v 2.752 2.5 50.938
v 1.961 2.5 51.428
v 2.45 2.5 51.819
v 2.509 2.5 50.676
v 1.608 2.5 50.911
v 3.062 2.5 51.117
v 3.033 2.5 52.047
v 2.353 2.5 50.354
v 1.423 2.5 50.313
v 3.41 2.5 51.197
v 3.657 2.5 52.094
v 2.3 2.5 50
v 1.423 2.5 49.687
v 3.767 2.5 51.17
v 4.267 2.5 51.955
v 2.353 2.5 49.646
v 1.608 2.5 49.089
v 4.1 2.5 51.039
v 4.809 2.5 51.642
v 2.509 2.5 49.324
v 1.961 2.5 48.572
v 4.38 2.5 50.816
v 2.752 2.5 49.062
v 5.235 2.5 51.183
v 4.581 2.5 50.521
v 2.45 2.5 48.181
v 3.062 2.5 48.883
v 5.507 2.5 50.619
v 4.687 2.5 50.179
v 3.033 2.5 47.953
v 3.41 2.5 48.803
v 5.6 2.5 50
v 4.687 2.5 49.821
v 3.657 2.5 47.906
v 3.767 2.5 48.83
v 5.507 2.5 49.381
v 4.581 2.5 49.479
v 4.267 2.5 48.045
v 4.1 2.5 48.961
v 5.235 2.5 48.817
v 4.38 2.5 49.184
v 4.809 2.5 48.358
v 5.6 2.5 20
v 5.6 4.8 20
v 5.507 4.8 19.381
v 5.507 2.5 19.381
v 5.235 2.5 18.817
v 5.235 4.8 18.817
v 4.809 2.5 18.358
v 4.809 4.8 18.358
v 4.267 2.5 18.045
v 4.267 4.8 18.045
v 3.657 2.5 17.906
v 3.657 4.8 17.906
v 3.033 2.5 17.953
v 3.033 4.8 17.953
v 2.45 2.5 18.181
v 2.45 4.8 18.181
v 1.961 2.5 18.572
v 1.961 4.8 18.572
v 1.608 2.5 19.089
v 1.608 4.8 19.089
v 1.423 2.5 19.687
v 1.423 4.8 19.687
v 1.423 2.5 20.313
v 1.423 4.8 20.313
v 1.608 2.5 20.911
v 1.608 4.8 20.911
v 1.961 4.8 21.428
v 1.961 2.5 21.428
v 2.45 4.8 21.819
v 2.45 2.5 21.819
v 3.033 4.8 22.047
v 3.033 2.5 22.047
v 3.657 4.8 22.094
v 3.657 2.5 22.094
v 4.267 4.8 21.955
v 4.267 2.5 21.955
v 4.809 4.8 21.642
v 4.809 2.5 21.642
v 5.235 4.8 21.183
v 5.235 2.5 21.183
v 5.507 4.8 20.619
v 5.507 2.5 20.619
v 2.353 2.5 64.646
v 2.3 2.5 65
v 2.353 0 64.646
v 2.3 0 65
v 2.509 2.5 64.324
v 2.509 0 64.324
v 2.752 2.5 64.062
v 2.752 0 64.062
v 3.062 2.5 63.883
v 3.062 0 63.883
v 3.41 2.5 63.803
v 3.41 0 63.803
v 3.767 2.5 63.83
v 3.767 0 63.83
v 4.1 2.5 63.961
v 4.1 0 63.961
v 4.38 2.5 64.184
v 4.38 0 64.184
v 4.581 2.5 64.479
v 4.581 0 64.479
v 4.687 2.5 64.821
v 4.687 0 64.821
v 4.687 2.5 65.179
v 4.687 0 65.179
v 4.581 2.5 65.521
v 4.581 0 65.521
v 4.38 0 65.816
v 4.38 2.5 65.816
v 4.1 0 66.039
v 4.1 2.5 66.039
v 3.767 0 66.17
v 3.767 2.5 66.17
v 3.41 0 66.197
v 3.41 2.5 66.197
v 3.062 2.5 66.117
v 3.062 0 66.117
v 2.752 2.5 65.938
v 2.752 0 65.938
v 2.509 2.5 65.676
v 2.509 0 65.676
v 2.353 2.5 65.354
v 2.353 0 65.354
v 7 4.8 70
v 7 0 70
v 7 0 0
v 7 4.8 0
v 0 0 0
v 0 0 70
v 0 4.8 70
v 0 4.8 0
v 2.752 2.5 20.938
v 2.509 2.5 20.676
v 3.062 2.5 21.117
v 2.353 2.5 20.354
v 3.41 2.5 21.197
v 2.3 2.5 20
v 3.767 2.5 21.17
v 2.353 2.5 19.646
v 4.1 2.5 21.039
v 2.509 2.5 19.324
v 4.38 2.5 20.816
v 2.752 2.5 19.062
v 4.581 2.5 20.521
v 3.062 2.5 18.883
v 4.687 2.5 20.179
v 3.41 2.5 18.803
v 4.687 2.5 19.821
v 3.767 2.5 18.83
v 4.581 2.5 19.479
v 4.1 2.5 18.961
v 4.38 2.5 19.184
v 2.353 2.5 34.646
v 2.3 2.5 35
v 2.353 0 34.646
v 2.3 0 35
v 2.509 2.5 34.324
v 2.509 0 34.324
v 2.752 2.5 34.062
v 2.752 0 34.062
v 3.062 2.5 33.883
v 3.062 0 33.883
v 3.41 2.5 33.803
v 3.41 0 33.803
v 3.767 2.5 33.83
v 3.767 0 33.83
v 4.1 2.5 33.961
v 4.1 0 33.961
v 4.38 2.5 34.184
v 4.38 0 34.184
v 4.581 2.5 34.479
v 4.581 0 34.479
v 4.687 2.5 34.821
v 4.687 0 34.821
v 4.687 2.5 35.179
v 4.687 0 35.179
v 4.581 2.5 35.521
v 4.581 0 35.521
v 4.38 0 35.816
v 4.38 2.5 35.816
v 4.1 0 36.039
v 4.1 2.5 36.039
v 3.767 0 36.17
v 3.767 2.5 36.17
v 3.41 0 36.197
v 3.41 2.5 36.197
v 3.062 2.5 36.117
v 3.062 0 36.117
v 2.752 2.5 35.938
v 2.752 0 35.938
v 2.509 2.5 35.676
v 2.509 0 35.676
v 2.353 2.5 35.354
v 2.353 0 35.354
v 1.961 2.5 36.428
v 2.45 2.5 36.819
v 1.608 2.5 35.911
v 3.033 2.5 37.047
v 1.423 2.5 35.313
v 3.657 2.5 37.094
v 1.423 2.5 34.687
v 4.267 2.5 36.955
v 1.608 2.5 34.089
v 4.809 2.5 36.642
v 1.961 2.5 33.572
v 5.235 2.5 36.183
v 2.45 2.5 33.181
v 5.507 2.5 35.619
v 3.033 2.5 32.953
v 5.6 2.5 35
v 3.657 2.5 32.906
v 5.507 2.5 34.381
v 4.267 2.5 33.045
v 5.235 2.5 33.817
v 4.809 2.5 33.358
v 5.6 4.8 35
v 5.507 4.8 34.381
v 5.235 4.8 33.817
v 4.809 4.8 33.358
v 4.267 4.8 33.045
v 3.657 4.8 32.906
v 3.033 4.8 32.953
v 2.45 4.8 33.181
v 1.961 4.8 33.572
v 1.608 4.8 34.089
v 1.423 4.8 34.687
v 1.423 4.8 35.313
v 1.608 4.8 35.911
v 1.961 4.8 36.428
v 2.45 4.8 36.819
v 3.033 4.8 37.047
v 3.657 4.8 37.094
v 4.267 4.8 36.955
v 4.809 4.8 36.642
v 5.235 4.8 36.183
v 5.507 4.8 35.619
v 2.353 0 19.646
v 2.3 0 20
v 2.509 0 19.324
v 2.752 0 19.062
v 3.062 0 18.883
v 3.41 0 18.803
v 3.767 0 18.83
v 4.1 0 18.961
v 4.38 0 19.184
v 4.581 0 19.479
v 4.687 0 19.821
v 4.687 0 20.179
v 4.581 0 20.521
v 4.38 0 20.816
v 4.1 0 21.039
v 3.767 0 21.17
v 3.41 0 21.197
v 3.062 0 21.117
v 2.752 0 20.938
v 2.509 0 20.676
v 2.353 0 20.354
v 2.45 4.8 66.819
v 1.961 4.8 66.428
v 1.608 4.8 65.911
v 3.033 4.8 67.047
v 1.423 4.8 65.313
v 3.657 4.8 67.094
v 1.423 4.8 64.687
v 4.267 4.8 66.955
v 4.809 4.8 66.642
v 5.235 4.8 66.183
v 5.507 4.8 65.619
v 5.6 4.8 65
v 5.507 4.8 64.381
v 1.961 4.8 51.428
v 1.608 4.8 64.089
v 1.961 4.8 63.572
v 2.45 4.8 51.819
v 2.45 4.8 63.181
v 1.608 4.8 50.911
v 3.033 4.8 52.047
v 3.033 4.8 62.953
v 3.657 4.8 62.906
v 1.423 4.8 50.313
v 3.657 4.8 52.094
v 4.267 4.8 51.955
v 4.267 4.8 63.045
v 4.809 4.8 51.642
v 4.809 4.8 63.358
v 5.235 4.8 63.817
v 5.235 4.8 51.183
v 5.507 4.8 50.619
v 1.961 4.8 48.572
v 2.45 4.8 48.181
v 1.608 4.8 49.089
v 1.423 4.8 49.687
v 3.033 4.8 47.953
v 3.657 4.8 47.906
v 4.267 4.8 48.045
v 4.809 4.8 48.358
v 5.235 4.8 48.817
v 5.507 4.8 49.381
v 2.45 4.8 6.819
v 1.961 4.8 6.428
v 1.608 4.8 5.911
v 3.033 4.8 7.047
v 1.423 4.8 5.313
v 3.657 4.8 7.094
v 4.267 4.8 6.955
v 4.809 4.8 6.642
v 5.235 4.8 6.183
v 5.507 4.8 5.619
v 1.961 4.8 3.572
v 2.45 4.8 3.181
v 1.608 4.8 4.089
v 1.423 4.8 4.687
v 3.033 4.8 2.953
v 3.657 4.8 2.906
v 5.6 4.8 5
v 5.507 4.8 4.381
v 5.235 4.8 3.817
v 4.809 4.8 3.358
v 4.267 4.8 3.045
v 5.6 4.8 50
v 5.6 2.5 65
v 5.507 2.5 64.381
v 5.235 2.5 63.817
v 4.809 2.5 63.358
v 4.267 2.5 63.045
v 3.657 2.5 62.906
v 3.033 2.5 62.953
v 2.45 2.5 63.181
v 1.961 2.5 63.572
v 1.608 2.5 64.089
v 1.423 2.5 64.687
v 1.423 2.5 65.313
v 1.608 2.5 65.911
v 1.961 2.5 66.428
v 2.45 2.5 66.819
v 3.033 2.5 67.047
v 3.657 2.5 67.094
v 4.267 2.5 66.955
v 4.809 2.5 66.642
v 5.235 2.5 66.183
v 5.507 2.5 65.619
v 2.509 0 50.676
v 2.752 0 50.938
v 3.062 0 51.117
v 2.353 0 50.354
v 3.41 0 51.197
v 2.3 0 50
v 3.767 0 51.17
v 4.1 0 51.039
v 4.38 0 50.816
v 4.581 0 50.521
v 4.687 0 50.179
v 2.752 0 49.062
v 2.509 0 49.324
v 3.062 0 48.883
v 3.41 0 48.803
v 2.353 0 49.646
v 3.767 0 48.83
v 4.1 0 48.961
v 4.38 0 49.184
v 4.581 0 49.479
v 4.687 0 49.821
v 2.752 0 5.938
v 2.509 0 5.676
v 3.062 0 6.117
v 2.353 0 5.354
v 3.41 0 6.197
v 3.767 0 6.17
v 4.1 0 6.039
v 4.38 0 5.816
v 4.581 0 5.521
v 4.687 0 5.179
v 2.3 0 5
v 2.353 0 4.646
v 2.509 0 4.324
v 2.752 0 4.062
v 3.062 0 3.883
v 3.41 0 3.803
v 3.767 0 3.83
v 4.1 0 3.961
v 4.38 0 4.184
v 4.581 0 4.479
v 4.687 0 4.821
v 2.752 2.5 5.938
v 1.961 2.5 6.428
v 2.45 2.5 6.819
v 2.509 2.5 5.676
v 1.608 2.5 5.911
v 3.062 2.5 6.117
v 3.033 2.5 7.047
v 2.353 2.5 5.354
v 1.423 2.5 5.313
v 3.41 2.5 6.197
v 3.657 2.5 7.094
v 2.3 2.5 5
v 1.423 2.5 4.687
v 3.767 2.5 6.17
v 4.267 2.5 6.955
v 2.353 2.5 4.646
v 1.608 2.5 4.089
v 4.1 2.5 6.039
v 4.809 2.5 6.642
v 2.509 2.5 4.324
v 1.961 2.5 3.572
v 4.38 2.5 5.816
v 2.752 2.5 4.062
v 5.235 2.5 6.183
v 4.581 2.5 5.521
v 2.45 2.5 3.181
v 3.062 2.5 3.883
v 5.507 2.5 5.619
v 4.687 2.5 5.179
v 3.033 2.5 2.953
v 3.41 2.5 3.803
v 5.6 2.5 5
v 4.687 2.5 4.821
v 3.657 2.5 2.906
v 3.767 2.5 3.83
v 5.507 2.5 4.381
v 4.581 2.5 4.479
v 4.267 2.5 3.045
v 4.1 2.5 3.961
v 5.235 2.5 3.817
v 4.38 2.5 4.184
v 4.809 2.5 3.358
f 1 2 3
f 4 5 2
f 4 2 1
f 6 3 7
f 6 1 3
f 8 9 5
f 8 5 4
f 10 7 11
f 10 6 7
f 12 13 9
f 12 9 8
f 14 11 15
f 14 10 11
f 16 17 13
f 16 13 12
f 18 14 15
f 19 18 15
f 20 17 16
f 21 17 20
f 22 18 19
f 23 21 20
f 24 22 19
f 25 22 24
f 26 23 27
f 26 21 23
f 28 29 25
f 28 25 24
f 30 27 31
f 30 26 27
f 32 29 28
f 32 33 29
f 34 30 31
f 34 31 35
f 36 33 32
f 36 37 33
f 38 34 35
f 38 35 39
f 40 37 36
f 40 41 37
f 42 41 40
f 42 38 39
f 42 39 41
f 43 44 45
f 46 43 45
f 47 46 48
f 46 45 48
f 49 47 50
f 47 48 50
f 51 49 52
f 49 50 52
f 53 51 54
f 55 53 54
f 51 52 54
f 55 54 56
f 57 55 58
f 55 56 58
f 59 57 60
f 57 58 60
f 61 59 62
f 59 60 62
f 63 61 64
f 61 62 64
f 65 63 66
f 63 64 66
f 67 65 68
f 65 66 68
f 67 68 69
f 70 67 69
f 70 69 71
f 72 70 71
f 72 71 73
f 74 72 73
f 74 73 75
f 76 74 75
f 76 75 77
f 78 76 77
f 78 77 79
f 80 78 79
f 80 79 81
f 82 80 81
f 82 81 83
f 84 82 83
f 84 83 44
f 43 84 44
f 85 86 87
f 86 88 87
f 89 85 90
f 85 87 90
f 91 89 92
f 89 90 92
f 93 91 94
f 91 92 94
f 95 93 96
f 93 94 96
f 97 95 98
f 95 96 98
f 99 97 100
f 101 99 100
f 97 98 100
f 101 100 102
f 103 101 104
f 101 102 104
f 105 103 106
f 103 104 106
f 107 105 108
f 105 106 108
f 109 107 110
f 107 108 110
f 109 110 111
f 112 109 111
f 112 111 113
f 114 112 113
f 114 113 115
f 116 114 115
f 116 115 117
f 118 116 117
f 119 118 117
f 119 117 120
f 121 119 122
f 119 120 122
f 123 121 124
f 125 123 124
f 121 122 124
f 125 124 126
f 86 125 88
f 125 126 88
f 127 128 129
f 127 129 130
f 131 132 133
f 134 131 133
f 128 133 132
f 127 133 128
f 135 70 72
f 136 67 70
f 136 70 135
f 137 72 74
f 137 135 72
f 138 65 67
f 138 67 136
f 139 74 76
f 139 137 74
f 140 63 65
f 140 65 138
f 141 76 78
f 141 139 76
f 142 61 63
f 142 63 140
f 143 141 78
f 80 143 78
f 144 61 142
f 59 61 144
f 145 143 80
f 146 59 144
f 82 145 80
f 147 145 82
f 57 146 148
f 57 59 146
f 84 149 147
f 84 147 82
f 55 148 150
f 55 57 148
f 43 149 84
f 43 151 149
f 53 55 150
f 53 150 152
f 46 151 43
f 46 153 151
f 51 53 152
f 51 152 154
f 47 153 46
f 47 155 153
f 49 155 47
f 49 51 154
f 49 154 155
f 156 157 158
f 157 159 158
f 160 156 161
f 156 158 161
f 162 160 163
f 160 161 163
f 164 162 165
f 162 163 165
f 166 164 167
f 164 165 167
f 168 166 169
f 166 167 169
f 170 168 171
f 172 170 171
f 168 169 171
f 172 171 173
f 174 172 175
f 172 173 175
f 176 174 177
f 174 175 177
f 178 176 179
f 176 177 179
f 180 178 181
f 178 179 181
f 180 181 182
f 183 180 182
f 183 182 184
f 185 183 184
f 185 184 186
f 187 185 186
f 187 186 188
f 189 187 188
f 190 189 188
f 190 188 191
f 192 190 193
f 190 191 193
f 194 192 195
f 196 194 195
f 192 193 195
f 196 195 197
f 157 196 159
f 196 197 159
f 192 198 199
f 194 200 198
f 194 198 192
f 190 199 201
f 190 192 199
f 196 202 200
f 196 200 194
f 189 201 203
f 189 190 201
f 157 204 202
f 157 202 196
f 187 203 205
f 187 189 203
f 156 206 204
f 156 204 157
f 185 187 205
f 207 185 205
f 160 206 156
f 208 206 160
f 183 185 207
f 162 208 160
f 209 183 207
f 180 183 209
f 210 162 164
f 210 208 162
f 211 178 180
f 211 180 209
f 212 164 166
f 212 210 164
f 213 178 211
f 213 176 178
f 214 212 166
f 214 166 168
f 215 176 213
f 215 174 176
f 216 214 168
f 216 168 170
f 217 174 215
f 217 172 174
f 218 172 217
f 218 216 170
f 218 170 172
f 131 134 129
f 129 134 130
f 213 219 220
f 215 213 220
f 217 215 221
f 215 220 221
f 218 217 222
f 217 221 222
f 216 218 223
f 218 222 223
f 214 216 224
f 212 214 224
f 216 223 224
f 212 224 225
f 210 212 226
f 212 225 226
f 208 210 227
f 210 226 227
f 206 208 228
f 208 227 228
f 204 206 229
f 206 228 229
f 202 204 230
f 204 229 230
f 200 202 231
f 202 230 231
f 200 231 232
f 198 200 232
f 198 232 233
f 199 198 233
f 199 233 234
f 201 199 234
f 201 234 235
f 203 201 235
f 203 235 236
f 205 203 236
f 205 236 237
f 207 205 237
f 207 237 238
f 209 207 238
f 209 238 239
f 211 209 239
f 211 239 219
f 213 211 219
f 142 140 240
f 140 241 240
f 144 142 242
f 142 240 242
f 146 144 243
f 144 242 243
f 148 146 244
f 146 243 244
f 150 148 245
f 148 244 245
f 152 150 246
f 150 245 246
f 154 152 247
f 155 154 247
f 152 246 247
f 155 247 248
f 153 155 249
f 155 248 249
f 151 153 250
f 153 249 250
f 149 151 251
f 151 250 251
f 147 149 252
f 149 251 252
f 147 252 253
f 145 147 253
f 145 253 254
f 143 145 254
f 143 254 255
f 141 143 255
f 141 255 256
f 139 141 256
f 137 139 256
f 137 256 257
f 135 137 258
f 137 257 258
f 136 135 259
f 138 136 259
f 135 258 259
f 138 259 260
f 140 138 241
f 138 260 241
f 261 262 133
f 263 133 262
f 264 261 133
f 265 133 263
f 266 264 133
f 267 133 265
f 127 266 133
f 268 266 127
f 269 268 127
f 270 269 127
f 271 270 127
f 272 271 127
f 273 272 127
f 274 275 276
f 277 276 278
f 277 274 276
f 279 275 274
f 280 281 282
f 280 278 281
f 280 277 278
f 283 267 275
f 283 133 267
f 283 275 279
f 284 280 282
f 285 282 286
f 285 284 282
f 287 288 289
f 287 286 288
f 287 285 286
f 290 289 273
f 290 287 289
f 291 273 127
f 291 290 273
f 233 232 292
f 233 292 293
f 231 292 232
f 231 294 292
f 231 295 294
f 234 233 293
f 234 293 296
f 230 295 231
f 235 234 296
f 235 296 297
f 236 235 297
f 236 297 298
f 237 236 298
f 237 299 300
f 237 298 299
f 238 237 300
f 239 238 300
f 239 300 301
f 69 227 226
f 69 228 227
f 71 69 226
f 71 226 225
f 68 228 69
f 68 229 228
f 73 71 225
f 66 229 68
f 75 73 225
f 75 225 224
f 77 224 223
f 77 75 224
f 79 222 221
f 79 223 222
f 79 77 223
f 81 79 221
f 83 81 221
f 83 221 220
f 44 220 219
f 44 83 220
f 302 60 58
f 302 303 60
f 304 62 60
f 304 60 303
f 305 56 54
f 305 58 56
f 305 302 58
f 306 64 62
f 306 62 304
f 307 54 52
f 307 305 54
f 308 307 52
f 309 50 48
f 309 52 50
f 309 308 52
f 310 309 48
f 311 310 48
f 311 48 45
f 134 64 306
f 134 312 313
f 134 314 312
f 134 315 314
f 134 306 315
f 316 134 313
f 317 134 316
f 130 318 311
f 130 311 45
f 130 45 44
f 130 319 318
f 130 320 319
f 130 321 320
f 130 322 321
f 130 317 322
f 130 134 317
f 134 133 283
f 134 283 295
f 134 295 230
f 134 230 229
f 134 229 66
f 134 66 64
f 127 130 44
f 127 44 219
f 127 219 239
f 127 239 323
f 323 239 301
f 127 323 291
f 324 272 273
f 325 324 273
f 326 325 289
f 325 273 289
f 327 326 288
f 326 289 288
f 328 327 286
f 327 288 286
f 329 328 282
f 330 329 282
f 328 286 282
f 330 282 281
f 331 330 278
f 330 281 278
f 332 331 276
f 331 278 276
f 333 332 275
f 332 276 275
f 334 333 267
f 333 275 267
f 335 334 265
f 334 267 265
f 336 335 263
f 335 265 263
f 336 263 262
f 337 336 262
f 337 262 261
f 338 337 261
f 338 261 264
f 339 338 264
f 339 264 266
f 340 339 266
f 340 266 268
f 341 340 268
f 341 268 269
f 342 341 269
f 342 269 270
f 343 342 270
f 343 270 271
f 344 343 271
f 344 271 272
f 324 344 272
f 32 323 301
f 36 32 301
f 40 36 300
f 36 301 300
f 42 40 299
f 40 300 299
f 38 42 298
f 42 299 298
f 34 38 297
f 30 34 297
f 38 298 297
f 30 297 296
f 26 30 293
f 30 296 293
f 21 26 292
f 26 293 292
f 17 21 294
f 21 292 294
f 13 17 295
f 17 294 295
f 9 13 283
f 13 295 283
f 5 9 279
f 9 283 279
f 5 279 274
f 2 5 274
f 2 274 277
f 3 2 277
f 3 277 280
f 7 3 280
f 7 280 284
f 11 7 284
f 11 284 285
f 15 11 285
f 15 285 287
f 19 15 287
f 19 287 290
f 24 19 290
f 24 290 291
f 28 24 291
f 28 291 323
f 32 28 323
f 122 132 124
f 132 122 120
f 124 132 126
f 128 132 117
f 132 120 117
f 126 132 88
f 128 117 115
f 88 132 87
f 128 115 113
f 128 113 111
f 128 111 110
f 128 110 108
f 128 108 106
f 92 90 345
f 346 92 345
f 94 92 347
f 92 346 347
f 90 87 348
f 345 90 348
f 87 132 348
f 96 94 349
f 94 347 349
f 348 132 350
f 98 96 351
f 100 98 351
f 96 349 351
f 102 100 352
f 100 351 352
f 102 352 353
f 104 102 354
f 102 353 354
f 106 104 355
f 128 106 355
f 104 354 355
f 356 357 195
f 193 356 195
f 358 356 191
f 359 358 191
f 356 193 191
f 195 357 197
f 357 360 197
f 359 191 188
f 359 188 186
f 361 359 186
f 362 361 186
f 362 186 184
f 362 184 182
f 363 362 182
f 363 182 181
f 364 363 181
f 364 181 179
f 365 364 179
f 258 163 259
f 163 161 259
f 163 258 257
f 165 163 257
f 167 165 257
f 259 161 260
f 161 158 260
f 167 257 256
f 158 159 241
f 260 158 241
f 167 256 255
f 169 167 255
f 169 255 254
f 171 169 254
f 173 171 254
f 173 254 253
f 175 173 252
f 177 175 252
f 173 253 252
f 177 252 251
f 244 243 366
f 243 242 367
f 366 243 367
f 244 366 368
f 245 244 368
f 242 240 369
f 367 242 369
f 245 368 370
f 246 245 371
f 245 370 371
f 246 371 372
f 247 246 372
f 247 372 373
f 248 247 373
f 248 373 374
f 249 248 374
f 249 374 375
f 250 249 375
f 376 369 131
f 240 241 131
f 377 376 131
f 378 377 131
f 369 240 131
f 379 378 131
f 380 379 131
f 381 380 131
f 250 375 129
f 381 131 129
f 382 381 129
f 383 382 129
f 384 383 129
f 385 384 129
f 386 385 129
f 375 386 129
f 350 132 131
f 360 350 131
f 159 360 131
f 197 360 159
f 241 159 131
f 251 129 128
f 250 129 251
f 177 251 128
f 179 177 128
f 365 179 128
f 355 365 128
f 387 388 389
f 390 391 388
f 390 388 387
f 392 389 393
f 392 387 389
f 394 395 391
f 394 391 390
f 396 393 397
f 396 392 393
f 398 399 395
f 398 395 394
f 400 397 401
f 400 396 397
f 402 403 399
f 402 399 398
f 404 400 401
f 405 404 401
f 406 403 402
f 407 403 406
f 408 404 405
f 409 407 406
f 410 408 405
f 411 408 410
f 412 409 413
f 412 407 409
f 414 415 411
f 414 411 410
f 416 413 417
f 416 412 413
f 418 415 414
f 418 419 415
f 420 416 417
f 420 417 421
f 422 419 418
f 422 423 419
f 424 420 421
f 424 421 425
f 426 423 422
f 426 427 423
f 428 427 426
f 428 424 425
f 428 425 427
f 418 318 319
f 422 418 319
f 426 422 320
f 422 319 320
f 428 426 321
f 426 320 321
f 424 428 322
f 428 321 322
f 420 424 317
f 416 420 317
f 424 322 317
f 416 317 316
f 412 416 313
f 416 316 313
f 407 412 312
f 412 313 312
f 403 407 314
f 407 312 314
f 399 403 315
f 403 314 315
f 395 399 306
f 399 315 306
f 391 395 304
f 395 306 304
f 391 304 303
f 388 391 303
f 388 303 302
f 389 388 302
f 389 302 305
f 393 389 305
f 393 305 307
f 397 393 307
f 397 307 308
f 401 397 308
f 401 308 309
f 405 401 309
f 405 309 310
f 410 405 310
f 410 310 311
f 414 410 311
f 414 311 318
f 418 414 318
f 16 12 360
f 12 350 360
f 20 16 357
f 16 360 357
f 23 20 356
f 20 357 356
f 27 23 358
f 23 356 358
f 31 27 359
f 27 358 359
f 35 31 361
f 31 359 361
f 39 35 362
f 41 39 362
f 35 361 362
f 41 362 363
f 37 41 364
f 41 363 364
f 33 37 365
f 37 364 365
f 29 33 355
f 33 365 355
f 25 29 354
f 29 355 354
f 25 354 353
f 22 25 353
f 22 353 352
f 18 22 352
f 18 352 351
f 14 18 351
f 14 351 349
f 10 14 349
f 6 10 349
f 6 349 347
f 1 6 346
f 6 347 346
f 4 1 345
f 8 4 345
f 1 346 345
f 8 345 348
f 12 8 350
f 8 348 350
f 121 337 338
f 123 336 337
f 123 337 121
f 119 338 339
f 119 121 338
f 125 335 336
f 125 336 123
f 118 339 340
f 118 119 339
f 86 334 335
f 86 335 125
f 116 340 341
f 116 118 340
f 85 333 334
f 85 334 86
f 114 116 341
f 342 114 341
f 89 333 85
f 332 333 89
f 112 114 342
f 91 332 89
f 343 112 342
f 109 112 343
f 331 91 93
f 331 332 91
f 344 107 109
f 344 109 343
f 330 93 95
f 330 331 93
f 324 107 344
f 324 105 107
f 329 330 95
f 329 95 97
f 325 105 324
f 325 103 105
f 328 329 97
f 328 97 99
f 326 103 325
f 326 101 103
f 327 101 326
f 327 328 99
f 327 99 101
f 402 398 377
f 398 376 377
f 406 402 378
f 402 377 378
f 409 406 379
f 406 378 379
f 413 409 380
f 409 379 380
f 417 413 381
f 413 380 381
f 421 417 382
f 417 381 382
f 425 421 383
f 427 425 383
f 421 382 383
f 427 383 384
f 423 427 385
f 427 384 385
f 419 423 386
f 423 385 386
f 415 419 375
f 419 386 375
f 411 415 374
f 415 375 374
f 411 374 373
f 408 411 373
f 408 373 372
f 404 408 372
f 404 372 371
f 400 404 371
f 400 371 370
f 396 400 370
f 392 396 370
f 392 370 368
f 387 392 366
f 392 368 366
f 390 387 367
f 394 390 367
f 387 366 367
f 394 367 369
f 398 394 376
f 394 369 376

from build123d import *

# Parameters (mm, degrees)
SKETCH1_W                      = 7
SKETCH1_H                      = 4.8
BOSS_EXTRUDE1_DEPTH            = 70
CBORE_FOR_M2_SHCS1_D           = 2.4
CBORE_FOR_M2_SHCS1_CBORE_D     = 4.2
CBORE_FOR_M2_SHCS1_CBORE_DEPTH = 2.3


with BuildPart() as part:
    # Sketch1 → Boss-Extrude1 (new body)
    with BuildSketch(Plane.XY):
        with Locations((3.5, 2.4)):
            Rectangle(SKETCH1_W, SKETCH1_H)
    extrude(amount=BOSS_EXTRUDE1_DEPTH)

    # CBORE for M2 SHCS1 (through all)
    with Locations(Plane(origin=(0, 4.8, 0), x_dir=(1, 0, 0), z_dir=(0, 1, 0))):
        with Locations((3.5, -65), (3.5, -50), (3.5, -35), (3.5, -20), (3.5, -5)):
            CounterBoreHole(CBORE_FOR_M2_SHCS1_D / 2, CBORE_FOR_M2_SHCS1_CBORE_D / 2, CBORE_FOR_M2_SHCS1_CBORE_DEPTH)


solid = part.part
